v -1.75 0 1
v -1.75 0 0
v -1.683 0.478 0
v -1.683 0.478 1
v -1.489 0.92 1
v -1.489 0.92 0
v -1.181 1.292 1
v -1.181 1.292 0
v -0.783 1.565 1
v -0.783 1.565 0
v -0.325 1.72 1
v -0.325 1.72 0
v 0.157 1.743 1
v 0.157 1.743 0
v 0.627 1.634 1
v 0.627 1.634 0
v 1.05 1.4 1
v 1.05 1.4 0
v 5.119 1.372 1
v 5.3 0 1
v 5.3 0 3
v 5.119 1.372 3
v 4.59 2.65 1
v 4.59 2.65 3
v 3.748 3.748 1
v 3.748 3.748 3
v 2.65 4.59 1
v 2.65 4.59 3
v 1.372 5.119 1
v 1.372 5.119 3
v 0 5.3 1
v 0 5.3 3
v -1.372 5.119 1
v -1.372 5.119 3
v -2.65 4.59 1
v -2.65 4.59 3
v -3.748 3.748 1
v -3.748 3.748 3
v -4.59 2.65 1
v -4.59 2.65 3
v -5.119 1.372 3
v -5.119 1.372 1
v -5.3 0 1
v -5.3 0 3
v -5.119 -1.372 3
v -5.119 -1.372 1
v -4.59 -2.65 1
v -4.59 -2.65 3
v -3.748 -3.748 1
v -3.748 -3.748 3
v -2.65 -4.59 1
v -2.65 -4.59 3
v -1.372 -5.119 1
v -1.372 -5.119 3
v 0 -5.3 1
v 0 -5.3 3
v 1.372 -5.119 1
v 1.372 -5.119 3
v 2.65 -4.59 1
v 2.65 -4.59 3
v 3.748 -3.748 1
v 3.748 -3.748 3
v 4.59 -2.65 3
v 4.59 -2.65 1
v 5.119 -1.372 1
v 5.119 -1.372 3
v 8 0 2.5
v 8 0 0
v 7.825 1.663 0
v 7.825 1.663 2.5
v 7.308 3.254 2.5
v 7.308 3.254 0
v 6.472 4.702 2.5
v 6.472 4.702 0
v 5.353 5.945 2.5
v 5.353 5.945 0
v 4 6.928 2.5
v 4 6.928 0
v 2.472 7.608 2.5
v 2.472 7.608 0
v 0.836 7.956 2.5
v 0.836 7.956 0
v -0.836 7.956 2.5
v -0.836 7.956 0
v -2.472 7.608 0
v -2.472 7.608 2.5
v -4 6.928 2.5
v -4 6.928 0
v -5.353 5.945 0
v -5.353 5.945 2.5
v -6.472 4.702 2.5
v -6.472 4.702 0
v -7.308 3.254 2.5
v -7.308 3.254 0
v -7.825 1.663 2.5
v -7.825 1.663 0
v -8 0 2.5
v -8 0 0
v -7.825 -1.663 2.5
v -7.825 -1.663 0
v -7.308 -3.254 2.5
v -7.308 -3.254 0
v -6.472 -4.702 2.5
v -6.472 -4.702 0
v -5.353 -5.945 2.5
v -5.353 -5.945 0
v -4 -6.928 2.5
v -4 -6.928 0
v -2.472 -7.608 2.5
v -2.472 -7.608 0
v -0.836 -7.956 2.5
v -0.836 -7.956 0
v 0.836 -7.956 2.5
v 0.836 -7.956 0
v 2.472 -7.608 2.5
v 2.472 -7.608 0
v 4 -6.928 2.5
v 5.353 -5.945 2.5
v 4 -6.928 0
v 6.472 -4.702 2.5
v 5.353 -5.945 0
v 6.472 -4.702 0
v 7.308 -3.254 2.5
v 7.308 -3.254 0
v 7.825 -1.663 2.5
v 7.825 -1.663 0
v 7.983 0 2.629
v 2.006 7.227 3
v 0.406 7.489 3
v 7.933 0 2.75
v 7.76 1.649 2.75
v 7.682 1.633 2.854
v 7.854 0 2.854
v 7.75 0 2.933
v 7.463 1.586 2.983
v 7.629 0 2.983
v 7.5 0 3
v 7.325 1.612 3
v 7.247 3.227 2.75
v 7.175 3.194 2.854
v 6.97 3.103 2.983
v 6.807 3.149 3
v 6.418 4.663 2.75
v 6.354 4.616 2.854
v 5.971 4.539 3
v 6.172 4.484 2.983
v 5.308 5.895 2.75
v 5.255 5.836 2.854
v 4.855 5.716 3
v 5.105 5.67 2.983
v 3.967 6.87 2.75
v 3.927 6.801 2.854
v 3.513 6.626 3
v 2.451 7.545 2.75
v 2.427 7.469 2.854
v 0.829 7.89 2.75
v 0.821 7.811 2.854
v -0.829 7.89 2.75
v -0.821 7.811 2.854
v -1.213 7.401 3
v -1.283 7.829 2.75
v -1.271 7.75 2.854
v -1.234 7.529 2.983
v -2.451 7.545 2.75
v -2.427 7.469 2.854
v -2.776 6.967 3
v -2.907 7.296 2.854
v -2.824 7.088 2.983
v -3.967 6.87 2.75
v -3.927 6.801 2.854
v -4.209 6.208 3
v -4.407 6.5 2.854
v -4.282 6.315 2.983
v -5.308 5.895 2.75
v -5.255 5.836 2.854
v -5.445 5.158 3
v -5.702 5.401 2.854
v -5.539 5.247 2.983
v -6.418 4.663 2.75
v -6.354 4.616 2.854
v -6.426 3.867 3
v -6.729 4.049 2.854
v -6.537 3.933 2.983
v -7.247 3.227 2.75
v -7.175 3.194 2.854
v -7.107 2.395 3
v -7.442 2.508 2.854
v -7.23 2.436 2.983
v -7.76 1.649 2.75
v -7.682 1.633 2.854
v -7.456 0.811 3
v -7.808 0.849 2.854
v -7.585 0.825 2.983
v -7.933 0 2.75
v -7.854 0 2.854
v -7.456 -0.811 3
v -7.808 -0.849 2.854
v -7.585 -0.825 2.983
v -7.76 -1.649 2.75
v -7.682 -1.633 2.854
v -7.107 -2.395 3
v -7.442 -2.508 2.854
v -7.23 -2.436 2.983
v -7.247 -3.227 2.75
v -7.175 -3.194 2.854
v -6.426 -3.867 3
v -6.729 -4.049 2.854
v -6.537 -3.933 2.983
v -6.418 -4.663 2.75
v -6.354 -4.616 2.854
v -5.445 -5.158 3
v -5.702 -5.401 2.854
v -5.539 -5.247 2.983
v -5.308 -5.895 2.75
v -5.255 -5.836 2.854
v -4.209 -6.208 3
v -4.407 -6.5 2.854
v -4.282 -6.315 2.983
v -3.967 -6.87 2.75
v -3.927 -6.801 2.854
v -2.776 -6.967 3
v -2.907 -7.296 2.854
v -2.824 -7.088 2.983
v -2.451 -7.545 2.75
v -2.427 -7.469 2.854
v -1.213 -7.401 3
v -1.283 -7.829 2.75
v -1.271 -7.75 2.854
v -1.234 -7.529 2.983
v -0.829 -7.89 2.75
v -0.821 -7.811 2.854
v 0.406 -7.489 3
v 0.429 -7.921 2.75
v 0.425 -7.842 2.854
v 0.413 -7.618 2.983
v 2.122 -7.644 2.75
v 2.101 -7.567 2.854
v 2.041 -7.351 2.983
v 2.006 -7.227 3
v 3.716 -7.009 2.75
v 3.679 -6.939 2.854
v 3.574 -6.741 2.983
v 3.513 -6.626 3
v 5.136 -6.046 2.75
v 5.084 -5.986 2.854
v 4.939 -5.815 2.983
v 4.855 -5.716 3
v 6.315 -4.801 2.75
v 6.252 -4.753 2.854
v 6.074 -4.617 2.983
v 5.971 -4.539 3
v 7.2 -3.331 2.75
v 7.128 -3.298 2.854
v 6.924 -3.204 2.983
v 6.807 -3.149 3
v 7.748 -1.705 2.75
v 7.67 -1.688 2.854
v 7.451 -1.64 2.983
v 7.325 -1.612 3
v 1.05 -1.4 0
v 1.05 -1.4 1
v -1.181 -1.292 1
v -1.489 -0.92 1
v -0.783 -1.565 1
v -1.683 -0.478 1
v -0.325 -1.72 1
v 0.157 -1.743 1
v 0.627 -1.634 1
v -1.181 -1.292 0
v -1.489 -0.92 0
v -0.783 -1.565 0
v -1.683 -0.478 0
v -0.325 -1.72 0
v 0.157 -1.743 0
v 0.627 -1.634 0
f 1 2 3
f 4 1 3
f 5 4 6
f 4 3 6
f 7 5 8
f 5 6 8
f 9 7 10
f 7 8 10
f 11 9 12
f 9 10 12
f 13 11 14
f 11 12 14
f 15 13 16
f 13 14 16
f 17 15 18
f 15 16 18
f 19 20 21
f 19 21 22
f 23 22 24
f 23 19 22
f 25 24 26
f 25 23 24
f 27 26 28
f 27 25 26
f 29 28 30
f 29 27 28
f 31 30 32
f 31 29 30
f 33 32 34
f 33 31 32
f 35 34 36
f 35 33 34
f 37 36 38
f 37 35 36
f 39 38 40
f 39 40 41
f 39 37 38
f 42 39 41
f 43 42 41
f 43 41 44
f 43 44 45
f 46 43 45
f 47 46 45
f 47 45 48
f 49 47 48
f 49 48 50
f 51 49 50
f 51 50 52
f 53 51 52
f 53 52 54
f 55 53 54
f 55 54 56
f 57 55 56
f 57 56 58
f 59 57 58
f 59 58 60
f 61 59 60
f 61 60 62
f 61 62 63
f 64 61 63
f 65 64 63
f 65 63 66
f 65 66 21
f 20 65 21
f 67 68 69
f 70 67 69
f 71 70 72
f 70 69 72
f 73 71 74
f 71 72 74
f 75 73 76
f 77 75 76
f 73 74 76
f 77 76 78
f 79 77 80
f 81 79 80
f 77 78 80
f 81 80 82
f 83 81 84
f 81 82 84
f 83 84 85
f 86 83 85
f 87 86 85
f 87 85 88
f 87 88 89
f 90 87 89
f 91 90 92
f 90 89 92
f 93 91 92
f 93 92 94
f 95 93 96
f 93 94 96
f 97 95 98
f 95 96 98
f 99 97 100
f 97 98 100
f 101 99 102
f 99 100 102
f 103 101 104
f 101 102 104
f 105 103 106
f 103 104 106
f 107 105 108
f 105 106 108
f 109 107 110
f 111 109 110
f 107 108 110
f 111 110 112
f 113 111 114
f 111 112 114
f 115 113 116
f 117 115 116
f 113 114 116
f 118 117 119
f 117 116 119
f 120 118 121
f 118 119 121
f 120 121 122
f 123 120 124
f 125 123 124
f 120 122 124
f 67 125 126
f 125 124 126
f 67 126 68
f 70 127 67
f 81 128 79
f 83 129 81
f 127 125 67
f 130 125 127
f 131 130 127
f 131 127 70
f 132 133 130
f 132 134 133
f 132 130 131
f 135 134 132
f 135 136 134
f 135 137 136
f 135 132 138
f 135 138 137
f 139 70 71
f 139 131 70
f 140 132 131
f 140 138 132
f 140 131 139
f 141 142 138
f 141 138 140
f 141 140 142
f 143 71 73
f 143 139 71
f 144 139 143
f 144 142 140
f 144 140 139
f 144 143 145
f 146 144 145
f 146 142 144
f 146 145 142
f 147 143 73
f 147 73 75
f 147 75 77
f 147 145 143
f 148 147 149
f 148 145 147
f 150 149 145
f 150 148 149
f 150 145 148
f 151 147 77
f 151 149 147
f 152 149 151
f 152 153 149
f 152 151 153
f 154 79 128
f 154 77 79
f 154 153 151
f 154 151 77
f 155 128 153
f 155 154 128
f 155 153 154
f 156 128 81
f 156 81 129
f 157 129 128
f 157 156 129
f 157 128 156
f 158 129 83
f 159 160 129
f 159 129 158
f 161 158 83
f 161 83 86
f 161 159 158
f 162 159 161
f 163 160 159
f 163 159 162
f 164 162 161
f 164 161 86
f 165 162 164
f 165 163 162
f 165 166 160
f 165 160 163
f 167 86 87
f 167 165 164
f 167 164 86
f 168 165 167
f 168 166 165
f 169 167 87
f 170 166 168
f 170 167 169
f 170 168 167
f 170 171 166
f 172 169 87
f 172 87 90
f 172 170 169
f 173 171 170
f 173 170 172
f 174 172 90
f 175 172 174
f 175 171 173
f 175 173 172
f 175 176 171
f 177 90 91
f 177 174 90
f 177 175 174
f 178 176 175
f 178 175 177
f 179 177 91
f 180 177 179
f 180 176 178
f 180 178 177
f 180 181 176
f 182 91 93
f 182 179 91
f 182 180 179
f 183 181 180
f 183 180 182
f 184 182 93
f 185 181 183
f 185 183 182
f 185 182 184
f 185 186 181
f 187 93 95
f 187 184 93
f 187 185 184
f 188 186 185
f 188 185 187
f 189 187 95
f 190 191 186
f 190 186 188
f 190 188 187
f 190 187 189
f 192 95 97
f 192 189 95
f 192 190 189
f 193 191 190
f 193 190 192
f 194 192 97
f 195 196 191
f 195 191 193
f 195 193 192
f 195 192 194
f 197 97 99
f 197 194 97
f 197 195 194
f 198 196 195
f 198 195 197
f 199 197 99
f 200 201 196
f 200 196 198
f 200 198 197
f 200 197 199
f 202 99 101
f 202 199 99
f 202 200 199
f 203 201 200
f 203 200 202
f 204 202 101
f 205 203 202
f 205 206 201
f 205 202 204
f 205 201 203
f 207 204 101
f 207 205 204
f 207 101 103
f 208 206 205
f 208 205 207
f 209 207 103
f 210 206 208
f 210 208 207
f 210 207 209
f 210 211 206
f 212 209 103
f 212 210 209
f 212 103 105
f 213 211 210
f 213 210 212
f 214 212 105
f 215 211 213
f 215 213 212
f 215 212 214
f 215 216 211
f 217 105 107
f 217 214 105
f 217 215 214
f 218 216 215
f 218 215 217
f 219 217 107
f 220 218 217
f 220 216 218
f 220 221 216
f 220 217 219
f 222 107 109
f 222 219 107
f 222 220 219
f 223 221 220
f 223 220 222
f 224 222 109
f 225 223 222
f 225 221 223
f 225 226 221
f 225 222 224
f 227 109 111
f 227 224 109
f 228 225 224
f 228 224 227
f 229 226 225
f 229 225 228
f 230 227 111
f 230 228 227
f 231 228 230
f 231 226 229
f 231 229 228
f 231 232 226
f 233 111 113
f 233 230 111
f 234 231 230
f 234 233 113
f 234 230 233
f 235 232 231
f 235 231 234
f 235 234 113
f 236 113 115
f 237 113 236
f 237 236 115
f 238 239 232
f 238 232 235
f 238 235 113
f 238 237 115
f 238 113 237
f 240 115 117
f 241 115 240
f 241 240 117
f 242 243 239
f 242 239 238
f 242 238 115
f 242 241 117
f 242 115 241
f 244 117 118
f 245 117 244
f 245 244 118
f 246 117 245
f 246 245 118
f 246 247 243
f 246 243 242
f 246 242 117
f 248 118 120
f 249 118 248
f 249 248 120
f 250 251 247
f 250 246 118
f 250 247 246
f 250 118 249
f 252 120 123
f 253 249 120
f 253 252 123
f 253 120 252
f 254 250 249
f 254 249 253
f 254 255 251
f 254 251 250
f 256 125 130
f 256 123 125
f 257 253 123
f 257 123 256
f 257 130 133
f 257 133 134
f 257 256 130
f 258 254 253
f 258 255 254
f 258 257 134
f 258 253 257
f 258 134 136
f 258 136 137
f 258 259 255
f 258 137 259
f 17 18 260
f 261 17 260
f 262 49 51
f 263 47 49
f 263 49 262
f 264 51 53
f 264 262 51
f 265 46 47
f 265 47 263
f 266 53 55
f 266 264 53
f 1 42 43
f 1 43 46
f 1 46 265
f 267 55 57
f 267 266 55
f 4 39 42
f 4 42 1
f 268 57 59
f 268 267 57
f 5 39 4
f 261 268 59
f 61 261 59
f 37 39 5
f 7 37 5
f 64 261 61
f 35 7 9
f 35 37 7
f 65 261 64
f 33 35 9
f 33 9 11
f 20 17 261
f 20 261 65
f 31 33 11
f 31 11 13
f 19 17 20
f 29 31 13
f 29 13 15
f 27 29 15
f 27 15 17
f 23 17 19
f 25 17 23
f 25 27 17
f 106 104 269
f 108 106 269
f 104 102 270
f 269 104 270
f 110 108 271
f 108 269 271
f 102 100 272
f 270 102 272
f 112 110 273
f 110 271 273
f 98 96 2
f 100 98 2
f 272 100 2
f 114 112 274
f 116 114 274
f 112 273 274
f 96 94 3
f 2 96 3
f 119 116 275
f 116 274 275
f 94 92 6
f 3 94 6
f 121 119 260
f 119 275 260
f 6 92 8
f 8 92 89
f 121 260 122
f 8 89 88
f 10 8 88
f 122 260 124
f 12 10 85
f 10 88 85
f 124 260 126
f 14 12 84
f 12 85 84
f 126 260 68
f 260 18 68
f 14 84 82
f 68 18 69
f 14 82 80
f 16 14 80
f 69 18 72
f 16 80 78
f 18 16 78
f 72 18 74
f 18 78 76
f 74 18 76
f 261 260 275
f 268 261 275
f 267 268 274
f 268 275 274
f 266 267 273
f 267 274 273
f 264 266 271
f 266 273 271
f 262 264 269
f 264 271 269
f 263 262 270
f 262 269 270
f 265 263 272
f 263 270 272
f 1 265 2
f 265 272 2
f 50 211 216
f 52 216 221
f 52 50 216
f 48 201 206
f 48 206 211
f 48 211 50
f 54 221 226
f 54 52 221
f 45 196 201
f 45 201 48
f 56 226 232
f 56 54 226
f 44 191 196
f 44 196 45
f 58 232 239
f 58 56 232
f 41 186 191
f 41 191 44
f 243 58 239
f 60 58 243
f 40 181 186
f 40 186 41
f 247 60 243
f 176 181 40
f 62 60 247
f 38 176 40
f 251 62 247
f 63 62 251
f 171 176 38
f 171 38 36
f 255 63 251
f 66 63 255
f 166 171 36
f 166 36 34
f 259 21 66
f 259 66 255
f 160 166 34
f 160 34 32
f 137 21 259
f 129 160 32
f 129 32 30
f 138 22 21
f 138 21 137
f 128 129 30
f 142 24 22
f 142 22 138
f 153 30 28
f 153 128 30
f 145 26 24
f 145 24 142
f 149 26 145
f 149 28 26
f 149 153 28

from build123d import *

# Parameters (mm, degrees)
F0_R     = 5.3
F1_DEPTH = 1
F0_R_2   = 8
F2_DEPTH = 3
F3_R     = 0.5


with BuildPart() as f1:
    # F0 (on Top) → F1 (new body)
    with BuildSketch(Plane.XY):
        Circle(F0_R)
        with BuildLine():
            ThreePointArc((1.05, 1.4), (1.5652475842, 0.7826237921), (1.75, 0))
            ThreePointArc((1.75, 0), (1.5652475842, -0.7826237921), (1.05, -1.4))
            ThreePointArc((1.05, -1.4), (-0.7826237921, -1.5652475842), (-1.75, 0))
            ThreePointArc((-1.75, 0), (-0.7826237921, 1.5652475842), (1.05, 1.4))
        make_face(mode=Mode.SUBTRACT)
        with BuildLine():
            ThreePointArc((1.05, -1.4), (1.5652475842, -0.7826237921), (1.75, 0))
            ThreePointArc((1.75, 0), (1.5652475842, 0.7826237921), (1.05, 1.4))
            Line((1.05, 1.4), (1.05, 0))
            Line((1.05, 0), (1.05, -1.4))
        make_face()
    extrude(amount=F1_DEPTH)

    # F0 (on Top) → F2 (join)
    with BuildSketch(Plane.XY):
        Circle(F0_R_2)
        Circle(F0_R, mode=Mode.SUBTRACT)
    extrude(amount=F2_DEPTH)

    # F3
    f3_edges = [f1.edges().sort_by_distance(p)[0] for p in [
        (-8, 0, 3),
    ]]
    fillet(f3_edges, radius=F3_R)


solid = f1.part
